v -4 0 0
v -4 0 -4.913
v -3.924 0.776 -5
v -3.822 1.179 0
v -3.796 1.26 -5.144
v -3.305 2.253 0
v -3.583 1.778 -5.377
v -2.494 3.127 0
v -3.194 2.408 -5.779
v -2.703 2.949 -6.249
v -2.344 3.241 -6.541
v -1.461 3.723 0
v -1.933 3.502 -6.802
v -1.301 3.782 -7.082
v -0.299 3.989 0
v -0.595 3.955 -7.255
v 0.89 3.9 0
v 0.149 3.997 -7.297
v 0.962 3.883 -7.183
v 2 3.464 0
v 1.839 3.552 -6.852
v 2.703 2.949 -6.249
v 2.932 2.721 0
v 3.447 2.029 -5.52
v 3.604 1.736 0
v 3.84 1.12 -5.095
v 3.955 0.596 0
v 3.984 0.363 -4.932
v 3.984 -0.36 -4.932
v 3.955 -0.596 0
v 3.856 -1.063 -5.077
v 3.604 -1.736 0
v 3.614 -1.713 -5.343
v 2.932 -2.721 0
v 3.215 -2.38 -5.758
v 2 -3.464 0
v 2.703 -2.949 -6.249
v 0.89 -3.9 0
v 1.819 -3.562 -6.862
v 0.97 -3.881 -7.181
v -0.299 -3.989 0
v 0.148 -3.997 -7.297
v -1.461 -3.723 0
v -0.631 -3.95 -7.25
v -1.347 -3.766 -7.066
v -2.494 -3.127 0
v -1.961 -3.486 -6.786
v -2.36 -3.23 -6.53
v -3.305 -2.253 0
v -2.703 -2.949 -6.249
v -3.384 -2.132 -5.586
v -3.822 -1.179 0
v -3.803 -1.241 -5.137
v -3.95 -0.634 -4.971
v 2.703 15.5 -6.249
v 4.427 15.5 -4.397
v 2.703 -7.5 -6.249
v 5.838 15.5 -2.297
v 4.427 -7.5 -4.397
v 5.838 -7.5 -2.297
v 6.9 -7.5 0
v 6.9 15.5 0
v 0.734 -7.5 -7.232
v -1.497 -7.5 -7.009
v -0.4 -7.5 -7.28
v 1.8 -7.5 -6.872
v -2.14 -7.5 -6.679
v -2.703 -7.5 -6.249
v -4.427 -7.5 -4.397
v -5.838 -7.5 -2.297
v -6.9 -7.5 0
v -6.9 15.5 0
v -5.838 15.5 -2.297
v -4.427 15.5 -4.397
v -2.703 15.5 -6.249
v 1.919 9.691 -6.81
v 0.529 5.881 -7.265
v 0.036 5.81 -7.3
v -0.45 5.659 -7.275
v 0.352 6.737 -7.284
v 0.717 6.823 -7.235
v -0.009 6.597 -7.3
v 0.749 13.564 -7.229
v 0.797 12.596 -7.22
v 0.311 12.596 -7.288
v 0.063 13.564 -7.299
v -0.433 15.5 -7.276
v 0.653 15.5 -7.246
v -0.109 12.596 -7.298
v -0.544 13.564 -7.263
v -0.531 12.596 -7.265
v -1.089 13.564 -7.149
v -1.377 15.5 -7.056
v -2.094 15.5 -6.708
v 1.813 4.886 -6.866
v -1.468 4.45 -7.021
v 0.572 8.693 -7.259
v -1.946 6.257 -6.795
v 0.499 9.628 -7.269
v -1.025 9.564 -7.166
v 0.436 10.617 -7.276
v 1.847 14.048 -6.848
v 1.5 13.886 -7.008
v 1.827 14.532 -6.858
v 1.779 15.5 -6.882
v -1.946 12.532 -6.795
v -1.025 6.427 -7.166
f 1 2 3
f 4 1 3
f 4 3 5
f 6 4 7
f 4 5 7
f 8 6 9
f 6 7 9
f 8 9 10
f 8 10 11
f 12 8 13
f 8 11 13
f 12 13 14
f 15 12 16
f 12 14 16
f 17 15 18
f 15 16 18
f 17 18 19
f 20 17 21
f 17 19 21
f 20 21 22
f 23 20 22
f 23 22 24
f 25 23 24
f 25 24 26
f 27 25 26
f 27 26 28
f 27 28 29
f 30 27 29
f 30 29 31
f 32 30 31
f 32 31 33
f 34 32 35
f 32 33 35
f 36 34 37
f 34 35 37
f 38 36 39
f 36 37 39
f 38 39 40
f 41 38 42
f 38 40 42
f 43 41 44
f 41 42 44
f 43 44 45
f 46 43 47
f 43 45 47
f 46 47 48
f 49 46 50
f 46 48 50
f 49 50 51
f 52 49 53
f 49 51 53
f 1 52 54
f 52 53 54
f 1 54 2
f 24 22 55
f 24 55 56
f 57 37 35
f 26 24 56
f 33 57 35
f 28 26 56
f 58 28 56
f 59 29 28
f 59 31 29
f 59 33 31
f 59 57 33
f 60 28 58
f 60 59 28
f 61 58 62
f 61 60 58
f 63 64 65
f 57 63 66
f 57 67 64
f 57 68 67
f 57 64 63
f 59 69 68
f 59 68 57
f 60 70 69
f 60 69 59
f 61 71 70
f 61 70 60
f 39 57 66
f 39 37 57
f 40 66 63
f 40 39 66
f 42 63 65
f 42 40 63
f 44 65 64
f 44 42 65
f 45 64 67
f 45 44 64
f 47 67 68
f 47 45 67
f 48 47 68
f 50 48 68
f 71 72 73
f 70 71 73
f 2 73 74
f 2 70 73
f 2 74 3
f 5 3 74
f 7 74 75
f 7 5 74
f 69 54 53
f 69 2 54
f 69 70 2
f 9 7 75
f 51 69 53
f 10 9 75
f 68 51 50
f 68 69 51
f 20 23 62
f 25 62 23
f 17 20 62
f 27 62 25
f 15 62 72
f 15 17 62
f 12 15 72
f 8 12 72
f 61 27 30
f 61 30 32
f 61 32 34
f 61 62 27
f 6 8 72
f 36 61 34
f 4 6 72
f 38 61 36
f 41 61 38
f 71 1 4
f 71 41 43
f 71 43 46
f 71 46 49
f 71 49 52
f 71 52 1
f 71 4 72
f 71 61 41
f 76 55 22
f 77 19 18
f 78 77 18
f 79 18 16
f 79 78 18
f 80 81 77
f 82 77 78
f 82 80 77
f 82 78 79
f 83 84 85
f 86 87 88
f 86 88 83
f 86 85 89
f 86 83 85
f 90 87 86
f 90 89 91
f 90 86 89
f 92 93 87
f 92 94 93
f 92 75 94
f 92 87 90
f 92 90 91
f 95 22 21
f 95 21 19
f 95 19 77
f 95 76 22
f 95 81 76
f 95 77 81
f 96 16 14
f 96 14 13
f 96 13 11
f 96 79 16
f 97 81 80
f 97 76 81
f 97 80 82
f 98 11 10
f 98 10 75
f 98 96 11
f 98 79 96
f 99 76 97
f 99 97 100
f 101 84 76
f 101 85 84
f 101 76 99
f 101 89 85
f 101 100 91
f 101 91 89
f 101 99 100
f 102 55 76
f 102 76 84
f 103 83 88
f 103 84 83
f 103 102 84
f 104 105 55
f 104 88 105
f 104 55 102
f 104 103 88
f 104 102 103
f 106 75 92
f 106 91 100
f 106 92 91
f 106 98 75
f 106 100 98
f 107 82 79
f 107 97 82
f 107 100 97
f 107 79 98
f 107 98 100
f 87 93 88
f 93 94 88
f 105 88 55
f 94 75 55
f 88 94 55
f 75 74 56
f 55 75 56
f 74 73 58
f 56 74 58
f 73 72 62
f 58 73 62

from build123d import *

# Parameters (mm, degrees)
BOSS_EXTRUDE1_DEPTH      = 23
F_8_0_8_DIAMETER_HOLE1_D = 8
FILLET1_R                = 3.99999999


with BuildPart() as part:
    # Sketch1 → Boss-Extrude1 (new body)
    with BuildSketch(Plane.XZ.offset(7.5)):
        with BuildLine():
            Line((6.9, 0), (-6.9, 0))
            ThreePointArc((-6.9, 0), (-4.163490138, -4.720459639), (-3e-09, -8.247012535))
            ThreePointArc((-3e-09, -8.247012535), (4.163490136, -4.720459641), (6.9, 0))
        make_face()
    extrude(amount=-BOSS_EXTRUDE1_DEPTH)

    # Ø8.0 (8) Diameter Hole1 (through all)
    with Locations(Plane.XY):
        with Locations((0, 0)):
            Hole(F_8_0_8_DIAMETER_HOLE1_D / 2)

    # Fillet1
    fillet1_edges = [part.edges().sort_by_distance(p)[0] for p in [
        (-3e-09, 9.75, -8.247012535),
        (-3e-09, -5.75, -8.247012535),
    ]]
    fillet(fillet1_edges, radius=FILLET1_R)


solid = part.part
